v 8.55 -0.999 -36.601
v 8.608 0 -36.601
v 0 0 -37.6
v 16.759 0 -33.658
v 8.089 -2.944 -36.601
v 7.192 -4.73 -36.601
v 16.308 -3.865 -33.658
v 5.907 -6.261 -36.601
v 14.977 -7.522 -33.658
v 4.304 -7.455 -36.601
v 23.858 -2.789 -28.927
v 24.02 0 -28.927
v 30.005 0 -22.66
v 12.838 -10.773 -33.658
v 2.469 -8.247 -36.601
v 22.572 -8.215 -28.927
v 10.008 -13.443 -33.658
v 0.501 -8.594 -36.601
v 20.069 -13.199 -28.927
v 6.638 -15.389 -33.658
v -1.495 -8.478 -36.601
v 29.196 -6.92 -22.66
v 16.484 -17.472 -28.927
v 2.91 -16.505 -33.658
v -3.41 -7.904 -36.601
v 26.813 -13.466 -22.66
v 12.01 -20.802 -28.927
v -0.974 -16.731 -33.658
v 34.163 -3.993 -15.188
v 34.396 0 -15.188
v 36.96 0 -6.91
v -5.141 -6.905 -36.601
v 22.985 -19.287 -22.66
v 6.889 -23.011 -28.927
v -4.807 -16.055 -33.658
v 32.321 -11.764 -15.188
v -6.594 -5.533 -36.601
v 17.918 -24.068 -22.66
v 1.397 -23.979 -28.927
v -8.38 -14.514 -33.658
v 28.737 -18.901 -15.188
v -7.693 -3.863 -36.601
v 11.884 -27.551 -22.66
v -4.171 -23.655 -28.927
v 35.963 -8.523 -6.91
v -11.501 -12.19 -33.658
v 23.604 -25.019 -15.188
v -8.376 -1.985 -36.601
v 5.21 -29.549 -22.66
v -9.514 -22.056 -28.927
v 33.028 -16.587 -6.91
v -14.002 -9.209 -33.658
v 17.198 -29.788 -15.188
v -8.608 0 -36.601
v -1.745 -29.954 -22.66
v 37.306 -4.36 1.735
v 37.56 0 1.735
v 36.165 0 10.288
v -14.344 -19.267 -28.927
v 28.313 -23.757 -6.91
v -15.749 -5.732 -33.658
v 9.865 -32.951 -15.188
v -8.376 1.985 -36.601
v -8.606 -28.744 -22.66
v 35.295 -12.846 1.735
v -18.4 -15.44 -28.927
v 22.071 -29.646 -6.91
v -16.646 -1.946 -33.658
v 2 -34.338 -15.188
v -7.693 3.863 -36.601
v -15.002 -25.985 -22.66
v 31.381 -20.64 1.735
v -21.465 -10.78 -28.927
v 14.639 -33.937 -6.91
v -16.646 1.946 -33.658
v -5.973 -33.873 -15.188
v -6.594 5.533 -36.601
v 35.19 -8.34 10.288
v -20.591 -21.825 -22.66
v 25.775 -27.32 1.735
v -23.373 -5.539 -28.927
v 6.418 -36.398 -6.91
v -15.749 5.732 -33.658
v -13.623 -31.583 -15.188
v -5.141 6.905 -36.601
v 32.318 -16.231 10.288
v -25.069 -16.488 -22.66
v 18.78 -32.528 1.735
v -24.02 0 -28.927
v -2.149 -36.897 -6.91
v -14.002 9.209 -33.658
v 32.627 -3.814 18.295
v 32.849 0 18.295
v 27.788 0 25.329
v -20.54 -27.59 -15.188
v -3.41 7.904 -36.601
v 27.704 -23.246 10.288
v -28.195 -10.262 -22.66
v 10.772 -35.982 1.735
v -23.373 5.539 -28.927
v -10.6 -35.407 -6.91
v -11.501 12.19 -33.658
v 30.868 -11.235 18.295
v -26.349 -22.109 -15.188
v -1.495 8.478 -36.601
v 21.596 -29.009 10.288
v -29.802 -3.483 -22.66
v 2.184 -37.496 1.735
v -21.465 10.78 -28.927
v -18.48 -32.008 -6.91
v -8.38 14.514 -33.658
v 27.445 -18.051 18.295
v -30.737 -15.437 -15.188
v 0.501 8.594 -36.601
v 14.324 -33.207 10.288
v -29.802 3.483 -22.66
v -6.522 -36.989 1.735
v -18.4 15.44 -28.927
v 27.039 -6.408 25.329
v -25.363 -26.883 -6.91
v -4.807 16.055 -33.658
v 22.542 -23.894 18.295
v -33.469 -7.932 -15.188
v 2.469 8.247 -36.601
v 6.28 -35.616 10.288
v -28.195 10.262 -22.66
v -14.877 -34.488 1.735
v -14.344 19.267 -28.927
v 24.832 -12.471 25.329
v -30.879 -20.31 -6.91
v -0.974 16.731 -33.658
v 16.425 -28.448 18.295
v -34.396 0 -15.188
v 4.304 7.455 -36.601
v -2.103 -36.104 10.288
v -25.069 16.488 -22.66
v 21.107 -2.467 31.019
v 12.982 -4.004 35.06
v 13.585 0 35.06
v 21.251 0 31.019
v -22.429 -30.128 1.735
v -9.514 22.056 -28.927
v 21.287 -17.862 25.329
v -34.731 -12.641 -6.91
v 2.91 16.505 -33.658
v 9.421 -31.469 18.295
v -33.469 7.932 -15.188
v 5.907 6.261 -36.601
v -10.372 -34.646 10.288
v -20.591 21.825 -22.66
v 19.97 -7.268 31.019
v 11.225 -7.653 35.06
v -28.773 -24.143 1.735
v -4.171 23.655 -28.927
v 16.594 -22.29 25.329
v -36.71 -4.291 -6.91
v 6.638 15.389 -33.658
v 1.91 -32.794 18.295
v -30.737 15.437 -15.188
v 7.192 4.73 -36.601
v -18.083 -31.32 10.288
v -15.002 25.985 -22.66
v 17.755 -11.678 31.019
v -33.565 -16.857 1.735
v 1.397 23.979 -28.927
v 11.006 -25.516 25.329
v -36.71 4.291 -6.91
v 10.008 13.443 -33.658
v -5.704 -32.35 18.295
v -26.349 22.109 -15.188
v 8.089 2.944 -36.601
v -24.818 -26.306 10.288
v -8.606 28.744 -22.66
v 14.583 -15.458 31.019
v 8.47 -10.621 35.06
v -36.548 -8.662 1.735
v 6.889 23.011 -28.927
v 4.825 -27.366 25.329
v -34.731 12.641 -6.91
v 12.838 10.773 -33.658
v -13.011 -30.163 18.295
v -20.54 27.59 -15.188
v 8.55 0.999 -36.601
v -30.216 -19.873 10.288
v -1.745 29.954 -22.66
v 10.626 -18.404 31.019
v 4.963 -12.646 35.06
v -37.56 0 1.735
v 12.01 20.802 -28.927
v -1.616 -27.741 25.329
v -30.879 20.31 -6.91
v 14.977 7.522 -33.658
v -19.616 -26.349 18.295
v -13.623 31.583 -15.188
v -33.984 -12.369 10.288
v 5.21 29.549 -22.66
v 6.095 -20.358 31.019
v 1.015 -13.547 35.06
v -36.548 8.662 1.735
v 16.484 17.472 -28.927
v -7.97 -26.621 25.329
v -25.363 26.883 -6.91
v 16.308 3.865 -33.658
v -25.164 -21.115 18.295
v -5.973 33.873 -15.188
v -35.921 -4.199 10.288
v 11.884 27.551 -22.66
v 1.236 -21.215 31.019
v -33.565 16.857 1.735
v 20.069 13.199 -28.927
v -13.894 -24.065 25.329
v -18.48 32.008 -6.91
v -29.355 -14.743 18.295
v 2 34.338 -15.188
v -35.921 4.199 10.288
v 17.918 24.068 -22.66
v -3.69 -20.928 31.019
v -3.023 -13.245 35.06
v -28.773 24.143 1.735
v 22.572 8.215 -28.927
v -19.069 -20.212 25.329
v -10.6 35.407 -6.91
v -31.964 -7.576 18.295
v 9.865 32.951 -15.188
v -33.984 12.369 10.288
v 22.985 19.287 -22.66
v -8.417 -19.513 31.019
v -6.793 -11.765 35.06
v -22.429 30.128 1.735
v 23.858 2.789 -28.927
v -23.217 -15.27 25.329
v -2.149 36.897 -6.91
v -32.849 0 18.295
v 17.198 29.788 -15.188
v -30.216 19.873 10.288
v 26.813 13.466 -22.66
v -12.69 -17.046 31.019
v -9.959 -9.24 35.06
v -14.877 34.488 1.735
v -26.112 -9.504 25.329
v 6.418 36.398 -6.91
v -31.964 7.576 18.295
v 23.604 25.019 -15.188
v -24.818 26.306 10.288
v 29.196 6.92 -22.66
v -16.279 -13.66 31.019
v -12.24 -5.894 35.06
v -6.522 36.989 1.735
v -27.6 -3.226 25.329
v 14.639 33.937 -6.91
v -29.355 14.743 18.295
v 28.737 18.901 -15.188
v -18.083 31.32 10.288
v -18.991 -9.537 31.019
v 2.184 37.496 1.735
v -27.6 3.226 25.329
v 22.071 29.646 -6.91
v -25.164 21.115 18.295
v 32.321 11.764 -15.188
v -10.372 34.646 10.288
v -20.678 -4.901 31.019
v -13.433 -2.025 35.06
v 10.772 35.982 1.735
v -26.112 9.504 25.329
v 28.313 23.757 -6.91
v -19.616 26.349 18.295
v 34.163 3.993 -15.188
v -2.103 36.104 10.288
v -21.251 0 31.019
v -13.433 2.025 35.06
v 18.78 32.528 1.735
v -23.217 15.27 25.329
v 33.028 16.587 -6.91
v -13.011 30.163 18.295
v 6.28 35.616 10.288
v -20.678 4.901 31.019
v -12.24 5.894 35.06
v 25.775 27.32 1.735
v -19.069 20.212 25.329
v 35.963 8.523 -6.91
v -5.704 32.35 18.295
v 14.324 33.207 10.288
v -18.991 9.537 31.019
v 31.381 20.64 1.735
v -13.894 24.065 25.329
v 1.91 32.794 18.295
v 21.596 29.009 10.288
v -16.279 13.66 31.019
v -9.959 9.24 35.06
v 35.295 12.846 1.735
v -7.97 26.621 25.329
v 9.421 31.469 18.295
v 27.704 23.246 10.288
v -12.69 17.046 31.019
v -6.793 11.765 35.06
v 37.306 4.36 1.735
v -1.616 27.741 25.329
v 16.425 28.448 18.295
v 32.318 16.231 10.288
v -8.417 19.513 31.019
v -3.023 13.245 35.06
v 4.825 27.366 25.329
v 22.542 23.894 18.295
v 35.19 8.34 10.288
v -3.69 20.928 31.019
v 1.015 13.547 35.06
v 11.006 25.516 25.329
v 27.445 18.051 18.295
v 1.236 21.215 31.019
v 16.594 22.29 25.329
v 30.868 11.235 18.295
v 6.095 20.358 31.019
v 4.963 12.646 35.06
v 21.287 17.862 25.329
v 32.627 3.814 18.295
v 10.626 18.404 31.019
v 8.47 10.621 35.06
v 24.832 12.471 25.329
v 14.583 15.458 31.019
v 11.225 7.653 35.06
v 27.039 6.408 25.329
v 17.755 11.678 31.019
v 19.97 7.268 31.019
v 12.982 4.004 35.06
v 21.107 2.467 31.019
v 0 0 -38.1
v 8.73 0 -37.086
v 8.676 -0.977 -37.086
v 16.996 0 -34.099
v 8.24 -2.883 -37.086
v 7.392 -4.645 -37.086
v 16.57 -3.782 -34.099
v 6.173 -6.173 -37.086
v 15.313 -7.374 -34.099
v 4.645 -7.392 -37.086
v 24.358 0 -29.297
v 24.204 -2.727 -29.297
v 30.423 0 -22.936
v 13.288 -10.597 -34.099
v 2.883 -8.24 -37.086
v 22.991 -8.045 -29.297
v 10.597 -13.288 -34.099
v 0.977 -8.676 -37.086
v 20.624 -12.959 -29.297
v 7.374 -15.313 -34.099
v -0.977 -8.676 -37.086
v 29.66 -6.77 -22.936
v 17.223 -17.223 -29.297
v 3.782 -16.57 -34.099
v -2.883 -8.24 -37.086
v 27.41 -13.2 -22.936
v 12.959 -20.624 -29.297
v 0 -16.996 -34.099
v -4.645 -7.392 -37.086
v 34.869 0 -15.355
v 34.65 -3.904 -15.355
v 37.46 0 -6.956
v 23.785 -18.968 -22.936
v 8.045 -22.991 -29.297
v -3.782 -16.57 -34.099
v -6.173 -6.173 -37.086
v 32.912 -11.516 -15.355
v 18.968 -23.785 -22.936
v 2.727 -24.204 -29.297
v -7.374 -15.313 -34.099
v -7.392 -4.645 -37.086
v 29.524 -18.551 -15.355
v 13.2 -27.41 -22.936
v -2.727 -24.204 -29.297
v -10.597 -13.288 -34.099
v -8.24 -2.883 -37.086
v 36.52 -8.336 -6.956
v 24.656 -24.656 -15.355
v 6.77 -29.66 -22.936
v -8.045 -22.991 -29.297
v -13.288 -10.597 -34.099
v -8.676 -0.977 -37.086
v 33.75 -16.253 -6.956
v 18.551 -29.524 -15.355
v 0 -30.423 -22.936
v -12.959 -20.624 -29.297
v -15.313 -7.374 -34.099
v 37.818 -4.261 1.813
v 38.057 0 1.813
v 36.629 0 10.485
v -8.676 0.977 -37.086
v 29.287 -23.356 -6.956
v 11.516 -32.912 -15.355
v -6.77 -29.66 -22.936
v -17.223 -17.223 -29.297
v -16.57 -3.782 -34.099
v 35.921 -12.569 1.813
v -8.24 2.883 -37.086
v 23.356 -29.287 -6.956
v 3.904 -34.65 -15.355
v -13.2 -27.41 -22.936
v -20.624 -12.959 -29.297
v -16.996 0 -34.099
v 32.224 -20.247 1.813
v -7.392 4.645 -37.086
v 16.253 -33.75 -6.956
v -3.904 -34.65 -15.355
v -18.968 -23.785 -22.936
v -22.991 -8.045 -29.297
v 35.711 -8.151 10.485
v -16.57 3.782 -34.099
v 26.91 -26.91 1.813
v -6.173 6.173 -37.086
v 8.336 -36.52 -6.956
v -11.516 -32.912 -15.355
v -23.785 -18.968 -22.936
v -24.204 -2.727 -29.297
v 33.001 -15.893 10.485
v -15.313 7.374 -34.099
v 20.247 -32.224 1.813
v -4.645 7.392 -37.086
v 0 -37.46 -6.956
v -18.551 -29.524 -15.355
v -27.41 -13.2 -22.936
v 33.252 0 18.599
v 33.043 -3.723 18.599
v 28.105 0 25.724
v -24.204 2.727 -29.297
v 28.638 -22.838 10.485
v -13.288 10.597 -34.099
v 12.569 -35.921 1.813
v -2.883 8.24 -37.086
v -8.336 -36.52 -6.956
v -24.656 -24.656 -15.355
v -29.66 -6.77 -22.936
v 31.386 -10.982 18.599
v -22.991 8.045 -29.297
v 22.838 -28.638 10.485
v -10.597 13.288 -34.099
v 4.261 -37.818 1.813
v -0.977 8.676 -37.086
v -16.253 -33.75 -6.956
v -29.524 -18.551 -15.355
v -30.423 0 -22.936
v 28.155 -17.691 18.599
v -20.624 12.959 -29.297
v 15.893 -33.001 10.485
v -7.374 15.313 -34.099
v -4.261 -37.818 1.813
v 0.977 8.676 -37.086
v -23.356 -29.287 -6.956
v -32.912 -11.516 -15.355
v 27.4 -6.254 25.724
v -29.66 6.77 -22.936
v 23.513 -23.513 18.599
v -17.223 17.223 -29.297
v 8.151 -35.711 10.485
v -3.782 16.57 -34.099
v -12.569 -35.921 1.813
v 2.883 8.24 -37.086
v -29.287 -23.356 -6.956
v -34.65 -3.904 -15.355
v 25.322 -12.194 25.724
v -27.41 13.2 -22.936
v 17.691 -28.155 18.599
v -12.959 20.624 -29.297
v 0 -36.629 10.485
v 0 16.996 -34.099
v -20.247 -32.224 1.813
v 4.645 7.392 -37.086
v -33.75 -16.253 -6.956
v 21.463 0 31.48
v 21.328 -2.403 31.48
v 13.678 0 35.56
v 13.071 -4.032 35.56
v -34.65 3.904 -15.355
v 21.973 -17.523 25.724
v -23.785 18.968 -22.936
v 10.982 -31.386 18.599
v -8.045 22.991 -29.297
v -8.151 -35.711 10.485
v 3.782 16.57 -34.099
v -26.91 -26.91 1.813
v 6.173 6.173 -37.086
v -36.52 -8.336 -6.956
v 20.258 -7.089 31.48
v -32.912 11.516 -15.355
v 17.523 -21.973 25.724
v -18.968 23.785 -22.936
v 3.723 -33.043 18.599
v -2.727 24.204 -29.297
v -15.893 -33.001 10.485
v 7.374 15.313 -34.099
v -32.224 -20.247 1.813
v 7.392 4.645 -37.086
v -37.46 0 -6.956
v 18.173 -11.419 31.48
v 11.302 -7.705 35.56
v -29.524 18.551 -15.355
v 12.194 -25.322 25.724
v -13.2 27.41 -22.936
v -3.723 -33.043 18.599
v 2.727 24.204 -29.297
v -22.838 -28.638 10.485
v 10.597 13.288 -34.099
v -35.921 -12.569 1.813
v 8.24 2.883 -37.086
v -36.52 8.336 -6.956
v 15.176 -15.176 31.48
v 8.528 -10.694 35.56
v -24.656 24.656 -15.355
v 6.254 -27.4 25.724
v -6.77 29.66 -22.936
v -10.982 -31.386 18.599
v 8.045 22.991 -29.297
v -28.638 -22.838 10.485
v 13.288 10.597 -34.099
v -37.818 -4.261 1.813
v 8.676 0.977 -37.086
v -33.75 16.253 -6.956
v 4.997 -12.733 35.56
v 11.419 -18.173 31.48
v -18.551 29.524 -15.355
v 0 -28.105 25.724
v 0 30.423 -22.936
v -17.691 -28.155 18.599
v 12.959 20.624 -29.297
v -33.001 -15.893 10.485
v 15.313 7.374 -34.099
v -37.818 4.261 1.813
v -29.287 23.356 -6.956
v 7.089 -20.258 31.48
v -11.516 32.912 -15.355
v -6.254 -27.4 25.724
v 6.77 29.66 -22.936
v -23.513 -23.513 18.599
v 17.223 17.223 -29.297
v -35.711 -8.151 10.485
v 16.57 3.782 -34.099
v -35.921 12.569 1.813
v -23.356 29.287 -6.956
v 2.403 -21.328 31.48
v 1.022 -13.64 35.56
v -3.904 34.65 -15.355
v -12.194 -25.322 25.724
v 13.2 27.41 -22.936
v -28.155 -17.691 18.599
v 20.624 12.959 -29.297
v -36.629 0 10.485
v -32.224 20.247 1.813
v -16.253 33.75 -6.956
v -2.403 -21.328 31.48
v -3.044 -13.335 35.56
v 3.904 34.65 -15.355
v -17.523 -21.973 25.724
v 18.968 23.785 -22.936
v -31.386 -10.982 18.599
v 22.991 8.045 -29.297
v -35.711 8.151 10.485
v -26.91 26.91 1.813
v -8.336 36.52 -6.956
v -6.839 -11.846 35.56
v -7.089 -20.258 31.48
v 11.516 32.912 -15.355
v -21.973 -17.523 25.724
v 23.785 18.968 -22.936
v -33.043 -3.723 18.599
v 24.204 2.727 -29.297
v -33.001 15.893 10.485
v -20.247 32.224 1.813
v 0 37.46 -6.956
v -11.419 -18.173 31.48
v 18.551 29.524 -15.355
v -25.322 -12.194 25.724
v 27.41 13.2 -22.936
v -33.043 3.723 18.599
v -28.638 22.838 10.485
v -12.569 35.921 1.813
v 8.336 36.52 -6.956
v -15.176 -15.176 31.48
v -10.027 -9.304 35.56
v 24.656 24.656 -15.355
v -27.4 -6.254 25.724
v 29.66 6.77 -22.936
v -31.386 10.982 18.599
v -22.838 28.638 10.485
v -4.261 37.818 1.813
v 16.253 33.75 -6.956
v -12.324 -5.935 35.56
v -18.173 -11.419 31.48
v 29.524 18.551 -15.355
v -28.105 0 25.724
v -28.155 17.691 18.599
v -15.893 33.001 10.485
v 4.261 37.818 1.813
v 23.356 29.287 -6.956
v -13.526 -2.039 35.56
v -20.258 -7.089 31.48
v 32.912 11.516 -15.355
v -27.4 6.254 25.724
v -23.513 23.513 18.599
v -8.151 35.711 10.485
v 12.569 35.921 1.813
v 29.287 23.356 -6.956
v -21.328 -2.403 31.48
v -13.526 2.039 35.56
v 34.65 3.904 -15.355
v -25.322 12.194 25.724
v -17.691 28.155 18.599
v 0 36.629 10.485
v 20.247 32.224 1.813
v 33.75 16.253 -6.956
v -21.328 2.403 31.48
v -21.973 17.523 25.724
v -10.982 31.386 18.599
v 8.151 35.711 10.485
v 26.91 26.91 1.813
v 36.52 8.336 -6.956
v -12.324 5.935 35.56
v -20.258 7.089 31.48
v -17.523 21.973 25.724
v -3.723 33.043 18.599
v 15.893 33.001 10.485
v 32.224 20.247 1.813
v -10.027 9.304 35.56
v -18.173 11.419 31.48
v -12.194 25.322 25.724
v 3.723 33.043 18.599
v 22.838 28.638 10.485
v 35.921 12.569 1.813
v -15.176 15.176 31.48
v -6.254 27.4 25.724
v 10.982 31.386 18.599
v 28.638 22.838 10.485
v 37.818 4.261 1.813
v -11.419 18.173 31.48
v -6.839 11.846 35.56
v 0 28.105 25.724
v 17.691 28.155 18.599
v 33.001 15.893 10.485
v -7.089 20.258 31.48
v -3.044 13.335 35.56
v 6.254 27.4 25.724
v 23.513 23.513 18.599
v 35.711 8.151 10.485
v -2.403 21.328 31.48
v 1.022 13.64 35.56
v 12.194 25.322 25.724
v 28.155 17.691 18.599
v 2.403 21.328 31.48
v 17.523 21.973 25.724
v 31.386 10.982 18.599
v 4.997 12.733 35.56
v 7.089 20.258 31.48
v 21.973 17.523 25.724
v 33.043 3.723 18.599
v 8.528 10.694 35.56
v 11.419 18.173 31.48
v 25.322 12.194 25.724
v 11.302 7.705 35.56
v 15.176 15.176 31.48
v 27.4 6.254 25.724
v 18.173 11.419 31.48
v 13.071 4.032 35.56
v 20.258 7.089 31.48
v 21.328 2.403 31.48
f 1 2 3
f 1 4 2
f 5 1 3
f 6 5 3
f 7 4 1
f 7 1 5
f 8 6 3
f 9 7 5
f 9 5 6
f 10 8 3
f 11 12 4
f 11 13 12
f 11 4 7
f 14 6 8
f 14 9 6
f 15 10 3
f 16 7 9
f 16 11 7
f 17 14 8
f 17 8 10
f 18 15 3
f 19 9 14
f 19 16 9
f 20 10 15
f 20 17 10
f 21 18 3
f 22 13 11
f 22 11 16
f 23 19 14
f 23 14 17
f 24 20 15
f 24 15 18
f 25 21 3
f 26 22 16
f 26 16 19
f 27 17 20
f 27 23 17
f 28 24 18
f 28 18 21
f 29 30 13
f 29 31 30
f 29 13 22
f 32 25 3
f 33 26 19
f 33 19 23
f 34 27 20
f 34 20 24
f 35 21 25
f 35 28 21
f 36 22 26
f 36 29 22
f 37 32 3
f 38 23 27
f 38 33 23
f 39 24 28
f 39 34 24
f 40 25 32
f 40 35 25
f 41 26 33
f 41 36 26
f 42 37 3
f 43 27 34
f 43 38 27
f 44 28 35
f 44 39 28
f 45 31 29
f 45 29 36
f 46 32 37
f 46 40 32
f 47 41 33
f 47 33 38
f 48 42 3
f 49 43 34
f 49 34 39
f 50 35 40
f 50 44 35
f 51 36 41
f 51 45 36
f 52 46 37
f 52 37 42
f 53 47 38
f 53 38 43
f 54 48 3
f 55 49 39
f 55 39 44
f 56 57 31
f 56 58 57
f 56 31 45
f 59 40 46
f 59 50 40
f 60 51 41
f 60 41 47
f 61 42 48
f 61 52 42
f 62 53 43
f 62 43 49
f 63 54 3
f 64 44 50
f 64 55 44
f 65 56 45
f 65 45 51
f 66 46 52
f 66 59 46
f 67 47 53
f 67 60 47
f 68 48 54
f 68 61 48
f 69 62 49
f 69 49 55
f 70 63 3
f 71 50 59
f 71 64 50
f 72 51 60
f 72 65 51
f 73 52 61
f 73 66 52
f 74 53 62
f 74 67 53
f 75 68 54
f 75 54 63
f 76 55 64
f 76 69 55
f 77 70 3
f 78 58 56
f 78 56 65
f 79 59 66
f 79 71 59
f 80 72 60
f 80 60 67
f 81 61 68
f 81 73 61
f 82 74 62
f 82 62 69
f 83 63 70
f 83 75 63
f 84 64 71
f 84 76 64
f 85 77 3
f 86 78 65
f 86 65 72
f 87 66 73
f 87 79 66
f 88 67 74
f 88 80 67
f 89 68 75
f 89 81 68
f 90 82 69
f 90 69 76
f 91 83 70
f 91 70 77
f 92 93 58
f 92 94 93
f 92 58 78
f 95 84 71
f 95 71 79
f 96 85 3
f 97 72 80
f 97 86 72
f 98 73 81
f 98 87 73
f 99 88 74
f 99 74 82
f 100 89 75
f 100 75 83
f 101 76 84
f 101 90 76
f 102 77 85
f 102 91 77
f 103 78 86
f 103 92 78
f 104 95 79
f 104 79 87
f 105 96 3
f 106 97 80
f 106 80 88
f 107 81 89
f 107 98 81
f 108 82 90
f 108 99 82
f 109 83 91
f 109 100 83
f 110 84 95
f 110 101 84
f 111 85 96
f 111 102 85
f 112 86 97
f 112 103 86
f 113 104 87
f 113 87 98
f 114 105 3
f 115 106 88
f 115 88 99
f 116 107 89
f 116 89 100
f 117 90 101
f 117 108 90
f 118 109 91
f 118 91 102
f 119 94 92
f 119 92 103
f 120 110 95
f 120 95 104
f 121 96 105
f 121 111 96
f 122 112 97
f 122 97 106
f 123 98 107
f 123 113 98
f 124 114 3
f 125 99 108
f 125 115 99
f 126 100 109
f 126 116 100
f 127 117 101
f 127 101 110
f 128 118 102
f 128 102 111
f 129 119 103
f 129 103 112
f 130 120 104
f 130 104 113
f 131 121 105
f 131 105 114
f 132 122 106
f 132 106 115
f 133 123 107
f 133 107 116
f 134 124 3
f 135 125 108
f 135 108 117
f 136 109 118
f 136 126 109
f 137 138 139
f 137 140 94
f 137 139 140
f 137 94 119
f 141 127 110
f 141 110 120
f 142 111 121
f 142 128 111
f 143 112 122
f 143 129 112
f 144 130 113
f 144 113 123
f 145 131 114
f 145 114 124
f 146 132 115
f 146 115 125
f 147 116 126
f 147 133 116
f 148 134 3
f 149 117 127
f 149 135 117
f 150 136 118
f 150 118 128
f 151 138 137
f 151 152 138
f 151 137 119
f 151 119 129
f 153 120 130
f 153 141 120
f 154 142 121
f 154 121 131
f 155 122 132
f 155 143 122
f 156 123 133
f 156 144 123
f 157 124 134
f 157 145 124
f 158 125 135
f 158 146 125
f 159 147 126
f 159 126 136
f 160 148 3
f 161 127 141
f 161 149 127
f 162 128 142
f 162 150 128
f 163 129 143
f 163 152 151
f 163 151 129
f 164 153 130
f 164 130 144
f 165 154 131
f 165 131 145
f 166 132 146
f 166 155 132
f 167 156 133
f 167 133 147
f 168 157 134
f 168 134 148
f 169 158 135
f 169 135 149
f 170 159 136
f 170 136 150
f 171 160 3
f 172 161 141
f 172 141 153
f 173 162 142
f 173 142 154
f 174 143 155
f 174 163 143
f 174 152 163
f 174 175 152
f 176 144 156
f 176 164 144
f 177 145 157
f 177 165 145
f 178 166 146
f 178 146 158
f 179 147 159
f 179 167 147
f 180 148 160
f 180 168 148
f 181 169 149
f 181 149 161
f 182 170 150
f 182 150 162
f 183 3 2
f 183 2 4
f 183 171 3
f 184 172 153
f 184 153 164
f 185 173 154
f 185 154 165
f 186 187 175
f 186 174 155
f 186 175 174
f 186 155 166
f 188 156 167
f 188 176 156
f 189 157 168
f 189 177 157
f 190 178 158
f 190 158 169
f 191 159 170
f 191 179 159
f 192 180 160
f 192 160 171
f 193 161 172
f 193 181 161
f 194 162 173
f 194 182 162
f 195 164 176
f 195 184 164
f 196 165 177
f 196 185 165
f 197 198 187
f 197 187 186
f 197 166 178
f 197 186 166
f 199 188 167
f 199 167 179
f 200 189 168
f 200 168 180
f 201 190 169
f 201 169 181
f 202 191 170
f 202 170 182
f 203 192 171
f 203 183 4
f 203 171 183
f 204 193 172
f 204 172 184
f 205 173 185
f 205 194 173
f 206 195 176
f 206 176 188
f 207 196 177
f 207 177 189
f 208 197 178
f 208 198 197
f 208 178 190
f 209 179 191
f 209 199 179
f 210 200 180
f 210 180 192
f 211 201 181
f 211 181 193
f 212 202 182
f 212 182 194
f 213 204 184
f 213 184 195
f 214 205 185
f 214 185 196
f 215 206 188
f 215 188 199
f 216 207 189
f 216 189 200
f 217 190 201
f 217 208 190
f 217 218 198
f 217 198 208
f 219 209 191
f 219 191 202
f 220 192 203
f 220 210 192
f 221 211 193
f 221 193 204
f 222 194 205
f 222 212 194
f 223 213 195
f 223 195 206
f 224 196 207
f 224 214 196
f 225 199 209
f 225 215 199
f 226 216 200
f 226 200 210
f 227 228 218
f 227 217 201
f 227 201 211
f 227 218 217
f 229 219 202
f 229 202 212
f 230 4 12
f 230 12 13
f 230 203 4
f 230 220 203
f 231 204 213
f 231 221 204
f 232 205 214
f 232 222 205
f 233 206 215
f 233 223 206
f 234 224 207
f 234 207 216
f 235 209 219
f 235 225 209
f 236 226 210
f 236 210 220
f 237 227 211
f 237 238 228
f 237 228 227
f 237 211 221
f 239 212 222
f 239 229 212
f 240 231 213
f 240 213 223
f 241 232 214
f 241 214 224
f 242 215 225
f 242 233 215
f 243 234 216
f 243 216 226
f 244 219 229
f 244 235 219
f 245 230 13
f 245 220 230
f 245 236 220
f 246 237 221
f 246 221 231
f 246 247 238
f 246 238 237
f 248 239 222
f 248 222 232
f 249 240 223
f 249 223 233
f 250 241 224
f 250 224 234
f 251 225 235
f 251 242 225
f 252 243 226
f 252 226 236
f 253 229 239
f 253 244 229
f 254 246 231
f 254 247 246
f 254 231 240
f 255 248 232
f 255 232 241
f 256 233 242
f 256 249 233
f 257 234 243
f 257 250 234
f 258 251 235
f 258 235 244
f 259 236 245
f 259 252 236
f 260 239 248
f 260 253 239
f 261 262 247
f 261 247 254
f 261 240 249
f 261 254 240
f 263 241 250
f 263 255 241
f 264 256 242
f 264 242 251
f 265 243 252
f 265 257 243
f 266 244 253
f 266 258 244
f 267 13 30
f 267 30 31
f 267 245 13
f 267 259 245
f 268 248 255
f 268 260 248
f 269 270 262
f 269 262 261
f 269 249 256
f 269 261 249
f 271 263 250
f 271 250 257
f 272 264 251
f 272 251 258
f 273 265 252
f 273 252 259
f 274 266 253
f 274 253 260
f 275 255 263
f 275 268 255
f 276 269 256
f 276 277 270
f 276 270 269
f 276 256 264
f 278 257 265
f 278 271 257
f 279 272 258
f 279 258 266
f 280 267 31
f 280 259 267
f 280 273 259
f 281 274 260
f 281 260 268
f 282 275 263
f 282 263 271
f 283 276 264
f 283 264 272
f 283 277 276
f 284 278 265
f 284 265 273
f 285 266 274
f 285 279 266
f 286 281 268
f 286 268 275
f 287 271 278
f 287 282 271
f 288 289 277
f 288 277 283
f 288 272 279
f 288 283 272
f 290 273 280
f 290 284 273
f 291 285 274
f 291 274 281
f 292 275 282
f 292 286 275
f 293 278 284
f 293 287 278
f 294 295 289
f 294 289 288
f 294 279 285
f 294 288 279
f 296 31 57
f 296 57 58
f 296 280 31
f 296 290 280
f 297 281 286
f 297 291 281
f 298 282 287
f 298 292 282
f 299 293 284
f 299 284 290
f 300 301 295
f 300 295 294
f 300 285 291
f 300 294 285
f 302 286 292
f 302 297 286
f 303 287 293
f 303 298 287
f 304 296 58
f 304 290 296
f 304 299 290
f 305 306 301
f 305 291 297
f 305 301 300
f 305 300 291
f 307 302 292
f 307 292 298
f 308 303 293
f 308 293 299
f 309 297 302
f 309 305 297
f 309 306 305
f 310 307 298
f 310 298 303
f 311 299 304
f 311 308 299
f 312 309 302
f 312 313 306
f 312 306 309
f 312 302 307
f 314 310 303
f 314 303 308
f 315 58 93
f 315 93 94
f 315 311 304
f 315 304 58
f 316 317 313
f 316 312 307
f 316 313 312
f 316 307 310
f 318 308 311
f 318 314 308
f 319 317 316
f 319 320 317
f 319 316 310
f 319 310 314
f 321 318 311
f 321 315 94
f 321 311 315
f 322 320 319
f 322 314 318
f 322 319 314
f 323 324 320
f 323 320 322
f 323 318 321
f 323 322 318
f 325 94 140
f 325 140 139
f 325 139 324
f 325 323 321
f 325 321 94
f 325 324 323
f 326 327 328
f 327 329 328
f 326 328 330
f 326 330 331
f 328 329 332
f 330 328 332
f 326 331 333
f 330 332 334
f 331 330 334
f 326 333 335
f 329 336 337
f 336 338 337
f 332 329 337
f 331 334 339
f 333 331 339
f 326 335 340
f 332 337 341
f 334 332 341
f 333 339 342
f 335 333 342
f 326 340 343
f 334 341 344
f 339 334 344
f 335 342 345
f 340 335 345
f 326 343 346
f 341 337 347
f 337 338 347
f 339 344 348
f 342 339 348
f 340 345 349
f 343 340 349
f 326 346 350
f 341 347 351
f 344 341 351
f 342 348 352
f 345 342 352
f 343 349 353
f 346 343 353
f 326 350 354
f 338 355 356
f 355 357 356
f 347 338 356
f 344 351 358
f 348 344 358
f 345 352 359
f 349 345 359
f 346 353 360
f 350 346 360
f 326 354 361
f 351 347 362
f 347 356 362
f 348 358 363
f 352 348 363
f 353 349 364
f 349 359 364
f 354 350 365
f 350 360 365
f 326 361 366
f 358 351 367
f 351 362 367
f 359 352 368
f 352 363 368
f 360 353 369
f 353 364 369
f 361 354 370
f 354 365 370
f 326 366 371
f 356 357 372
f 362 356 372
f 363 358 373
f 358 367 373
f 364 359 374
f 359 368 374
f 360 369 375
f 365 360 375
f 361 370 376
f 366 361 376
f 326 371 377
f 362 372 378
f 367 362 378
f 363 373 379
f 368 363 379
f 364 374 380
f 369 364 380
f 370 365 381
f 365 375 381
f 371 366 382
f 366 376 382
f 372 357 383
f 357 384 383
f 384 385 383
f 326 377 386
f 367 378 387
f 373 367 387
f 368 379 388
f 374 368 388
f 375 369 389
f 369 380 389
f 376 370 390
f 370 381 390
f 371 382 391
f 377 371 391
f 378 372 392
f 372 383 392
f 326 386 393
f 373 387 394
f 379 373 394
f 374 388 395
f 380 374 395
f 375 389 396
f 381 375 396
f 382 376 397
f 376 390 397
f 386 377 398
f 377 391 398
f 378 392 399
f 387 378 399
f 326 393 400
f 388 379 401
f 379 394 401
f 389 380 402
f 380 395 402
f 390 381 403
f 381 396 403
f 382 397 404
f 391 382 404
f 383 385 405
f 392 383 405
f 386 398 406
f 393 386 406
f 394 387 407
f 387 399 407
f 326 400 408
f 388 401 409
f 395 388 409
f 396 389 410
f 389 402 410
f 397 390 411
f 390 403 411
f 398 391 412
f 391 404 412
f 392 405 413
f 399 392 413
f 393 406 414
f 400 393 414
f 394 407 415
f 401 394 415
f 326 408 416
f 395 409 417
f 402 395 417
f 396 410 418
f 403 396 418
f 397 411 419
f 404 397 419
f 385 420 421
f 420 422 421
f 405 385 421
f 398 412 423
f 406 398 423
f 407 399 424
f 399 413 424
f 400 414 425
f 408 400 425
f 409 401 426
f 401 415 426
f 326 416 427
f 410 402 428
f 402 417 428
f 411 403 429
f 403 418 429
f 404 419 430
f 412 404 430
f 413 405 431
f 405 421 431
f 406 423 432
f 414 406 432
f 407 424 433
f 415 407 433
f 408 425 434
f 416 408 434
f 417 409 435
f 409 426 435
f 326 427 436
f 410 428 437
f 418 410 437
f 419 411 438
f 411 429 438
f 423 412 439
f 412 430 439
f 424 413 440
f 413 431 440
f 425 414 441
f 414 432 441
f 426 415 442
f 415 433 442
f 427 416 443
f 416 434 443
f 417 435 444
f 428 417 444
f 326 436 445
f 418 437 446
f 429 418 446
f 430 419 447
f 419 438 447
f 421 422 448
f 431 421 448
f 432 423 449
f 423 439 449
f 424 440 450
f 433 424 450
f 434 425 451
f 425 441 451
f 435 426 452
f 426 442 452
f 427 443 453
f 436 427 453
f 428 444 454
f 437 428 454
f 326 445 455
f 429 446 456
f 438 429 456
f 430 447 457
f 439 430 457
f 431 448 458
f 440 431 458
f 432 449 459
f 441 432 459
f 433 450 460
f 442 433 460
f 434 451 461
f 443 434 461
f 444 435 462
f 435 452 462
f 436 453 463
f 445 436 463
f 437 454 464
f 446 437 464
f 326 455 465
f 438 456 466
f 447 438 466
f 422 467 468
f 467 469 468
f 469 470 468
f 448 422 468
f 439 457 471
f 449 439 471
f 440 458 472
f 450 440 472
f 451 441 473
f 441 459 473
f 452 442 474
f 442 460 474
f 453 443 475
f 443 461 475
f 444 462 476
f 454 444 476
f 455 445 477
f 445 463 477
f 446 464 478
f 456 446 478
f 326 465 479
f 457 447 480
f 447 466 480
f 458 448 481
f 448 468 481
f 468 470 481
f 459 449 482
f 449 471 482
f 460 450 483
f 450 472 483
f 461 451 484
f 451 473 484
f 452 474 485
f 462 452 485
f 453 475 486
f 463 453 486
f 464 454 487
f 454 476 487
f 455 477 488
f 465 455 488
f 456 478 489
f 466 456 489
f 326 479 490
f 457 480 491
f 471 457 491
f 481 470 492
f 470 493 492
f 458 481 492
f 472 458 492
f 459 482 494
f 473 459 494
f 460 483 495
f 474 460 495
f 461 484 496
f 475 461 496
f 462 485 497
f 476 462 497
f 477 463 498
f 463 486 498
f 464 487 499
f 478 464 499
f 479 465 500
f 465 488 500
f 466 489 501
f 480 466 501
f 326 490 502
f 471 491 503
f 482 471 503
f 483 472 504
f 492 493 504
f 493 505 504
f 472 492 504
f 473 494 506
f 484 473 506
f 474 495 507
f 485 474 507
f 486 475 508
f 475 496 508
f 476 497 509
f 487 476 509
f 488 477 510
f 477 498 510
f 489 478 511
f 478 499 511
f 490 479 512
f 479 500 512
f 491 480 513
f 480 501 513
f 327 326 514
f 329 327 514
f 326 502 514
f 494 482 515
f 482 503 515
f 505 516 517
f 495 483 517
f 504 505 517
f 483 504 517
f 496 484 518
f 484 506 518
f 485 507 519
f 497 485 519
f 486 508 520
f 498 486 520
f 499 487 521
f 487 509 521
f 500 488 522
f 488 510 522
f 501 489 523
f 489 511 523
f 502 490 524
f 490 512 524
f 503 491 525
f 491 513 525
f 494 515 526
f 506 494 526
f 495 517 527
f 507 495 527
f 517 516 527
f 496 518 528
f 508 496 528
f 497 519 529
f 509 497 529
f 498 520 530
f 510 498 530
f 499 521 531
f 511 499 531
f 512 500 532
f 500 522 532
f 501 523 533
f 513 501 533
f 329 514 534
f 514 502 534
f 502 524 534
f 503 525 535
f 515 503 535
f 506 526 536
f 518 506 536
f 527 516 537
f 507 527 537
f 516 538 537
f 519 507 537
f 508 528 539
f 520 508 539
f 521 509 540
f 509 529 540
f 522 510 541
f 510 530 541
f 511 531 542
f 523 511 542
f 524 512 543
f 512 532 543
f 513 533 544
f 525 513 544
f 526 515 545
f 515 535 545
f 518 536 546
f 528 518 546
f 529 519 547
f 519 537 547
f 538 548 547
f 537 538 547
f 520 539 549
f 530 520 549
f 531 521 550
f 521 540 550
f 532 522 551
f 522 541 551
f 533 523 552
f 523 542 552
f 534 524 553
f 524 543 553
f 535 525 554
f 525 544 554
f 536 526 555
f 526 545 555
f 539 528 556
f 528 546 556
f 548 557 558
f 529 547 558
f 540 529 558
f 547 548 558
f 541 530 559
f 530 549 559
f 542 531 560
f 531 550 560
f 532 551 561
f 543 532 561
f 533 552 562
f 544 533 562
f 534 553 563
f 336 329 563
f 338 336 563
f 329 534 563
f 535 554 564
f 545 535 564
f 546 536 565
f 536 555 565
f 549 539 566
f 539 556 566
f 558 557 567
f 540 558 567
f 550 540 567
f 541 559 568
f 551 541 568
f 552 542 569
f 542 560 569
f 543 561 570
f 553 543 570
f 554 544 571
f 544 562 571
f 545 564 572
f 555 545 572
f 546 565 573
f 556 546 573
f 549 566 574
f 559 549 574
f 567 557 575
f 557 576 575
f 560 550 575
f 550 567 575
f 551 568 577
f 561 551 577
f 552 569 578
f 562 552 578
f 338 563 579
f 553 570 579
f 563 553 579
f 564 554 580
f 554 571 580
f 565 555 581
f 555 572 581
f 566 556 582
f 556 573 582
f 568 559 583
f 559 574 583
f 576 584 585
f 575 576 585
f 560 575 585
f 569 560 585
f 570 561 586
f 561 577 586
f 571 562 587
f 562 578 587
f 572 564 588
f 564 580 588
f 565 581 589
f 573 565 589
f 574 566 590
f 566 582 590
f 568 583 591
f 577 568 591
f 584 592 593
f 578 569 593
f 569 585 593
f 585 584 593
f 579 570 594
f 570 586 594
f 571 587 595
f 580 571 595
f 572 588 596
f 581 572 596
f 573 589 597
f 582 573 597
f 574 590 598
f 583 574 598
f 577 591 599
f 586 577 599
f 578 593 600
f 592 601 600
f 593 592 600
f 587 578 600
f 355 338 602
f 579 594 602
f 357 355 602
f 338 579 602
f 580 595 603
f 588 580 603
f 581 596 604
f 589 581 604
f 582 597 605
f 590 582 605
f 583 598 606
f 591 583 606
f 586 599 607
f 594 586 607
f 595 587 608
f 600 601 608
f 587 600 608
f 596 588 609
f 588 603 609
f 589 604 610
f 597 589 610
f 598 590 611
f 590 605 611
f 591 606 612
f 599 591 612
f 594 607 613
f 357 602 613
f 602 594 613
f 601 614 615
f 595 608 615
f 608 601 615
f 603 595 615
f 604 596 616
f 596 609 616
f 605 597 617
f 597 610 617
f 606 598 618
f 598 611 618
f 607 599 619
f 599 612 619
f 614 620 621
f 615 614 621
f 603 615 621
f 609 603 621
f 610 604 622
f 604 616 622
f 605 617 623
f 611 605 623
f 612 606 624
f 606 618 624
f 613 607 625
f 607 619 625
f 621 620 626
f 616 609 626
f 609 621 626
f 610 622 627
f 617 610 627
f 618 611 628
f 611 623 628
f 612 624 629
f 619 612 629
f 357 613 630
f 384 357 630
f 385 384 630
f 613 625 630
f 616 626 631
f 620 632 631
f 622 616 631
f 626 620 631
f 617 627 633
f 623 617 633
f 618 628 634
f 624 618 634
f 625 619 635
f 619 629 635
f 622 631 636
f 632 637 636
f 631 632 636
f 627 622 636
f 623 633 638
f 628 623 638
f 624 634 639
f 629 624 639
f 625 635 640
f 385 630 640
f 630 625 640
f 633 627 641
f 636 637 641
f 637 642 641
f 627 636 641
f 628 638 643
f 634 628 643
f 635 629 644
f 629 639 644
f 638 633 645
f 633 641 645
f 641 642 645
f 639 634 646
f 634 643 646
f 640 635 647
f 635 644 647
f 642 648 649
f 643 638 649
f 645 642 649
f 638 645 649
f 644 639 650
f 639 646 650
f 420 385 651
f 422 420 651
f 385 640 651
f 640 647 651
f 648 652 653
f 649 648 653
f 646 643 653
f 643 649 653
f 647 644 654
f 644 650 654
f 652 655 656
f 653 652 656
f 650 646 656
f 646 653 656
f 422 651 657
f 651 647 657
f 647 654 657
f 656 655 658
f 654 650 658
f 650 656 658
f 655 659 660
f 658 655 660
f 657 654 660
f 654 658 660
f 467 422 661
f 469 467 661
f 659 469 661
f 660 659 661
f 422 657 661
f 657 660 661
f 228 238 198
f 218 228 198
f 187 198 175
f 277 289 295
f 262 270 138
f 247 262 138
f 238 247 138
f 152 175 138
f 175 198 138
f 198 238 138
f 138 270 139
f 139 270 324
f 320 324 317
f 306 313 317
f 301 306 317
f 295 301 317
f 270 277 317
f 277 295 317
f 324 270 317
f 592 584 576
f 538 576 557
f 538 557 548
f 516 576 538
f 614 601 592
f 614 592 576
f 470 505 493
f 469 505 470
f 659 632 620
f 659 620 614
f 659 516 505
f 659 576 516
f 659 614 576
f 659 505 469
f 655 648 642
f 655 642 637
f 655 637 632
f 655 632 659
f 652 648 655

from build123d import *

# Parameters (mm, degrees)
F3_W     = 33.02
F3_H     = 33.02
F4_DEPTH = 25.4
F5_T     = -0.5


with BuildPart() as f1:
    # F0 (on Front) → F1 (revolve)
    with BuildSketch(Plane.XZ):
        with BuildLine():
            Line((0, 38.1), (0, -38.1))
            ThreePointArc((0, -38.1), (38.1, 0), (0, 38.1))
        make_face()
    revolve(axis=Axis((0, 0, 0), (0, 0, -1)))

    # F3 (on offset) → F4 (cut)
    with BuildSketch(Plane.XY.offset(35.56)):
        Rectangle(F3_W, F3_H)
    extrude(amount=F4_DEPTH, mode=Mode.SUBTRACT)

    # F5 (hollow: no face is removed)
    offset(amount=F5_T, mode=Mode.SUBTRACT)


solid = f1.part
